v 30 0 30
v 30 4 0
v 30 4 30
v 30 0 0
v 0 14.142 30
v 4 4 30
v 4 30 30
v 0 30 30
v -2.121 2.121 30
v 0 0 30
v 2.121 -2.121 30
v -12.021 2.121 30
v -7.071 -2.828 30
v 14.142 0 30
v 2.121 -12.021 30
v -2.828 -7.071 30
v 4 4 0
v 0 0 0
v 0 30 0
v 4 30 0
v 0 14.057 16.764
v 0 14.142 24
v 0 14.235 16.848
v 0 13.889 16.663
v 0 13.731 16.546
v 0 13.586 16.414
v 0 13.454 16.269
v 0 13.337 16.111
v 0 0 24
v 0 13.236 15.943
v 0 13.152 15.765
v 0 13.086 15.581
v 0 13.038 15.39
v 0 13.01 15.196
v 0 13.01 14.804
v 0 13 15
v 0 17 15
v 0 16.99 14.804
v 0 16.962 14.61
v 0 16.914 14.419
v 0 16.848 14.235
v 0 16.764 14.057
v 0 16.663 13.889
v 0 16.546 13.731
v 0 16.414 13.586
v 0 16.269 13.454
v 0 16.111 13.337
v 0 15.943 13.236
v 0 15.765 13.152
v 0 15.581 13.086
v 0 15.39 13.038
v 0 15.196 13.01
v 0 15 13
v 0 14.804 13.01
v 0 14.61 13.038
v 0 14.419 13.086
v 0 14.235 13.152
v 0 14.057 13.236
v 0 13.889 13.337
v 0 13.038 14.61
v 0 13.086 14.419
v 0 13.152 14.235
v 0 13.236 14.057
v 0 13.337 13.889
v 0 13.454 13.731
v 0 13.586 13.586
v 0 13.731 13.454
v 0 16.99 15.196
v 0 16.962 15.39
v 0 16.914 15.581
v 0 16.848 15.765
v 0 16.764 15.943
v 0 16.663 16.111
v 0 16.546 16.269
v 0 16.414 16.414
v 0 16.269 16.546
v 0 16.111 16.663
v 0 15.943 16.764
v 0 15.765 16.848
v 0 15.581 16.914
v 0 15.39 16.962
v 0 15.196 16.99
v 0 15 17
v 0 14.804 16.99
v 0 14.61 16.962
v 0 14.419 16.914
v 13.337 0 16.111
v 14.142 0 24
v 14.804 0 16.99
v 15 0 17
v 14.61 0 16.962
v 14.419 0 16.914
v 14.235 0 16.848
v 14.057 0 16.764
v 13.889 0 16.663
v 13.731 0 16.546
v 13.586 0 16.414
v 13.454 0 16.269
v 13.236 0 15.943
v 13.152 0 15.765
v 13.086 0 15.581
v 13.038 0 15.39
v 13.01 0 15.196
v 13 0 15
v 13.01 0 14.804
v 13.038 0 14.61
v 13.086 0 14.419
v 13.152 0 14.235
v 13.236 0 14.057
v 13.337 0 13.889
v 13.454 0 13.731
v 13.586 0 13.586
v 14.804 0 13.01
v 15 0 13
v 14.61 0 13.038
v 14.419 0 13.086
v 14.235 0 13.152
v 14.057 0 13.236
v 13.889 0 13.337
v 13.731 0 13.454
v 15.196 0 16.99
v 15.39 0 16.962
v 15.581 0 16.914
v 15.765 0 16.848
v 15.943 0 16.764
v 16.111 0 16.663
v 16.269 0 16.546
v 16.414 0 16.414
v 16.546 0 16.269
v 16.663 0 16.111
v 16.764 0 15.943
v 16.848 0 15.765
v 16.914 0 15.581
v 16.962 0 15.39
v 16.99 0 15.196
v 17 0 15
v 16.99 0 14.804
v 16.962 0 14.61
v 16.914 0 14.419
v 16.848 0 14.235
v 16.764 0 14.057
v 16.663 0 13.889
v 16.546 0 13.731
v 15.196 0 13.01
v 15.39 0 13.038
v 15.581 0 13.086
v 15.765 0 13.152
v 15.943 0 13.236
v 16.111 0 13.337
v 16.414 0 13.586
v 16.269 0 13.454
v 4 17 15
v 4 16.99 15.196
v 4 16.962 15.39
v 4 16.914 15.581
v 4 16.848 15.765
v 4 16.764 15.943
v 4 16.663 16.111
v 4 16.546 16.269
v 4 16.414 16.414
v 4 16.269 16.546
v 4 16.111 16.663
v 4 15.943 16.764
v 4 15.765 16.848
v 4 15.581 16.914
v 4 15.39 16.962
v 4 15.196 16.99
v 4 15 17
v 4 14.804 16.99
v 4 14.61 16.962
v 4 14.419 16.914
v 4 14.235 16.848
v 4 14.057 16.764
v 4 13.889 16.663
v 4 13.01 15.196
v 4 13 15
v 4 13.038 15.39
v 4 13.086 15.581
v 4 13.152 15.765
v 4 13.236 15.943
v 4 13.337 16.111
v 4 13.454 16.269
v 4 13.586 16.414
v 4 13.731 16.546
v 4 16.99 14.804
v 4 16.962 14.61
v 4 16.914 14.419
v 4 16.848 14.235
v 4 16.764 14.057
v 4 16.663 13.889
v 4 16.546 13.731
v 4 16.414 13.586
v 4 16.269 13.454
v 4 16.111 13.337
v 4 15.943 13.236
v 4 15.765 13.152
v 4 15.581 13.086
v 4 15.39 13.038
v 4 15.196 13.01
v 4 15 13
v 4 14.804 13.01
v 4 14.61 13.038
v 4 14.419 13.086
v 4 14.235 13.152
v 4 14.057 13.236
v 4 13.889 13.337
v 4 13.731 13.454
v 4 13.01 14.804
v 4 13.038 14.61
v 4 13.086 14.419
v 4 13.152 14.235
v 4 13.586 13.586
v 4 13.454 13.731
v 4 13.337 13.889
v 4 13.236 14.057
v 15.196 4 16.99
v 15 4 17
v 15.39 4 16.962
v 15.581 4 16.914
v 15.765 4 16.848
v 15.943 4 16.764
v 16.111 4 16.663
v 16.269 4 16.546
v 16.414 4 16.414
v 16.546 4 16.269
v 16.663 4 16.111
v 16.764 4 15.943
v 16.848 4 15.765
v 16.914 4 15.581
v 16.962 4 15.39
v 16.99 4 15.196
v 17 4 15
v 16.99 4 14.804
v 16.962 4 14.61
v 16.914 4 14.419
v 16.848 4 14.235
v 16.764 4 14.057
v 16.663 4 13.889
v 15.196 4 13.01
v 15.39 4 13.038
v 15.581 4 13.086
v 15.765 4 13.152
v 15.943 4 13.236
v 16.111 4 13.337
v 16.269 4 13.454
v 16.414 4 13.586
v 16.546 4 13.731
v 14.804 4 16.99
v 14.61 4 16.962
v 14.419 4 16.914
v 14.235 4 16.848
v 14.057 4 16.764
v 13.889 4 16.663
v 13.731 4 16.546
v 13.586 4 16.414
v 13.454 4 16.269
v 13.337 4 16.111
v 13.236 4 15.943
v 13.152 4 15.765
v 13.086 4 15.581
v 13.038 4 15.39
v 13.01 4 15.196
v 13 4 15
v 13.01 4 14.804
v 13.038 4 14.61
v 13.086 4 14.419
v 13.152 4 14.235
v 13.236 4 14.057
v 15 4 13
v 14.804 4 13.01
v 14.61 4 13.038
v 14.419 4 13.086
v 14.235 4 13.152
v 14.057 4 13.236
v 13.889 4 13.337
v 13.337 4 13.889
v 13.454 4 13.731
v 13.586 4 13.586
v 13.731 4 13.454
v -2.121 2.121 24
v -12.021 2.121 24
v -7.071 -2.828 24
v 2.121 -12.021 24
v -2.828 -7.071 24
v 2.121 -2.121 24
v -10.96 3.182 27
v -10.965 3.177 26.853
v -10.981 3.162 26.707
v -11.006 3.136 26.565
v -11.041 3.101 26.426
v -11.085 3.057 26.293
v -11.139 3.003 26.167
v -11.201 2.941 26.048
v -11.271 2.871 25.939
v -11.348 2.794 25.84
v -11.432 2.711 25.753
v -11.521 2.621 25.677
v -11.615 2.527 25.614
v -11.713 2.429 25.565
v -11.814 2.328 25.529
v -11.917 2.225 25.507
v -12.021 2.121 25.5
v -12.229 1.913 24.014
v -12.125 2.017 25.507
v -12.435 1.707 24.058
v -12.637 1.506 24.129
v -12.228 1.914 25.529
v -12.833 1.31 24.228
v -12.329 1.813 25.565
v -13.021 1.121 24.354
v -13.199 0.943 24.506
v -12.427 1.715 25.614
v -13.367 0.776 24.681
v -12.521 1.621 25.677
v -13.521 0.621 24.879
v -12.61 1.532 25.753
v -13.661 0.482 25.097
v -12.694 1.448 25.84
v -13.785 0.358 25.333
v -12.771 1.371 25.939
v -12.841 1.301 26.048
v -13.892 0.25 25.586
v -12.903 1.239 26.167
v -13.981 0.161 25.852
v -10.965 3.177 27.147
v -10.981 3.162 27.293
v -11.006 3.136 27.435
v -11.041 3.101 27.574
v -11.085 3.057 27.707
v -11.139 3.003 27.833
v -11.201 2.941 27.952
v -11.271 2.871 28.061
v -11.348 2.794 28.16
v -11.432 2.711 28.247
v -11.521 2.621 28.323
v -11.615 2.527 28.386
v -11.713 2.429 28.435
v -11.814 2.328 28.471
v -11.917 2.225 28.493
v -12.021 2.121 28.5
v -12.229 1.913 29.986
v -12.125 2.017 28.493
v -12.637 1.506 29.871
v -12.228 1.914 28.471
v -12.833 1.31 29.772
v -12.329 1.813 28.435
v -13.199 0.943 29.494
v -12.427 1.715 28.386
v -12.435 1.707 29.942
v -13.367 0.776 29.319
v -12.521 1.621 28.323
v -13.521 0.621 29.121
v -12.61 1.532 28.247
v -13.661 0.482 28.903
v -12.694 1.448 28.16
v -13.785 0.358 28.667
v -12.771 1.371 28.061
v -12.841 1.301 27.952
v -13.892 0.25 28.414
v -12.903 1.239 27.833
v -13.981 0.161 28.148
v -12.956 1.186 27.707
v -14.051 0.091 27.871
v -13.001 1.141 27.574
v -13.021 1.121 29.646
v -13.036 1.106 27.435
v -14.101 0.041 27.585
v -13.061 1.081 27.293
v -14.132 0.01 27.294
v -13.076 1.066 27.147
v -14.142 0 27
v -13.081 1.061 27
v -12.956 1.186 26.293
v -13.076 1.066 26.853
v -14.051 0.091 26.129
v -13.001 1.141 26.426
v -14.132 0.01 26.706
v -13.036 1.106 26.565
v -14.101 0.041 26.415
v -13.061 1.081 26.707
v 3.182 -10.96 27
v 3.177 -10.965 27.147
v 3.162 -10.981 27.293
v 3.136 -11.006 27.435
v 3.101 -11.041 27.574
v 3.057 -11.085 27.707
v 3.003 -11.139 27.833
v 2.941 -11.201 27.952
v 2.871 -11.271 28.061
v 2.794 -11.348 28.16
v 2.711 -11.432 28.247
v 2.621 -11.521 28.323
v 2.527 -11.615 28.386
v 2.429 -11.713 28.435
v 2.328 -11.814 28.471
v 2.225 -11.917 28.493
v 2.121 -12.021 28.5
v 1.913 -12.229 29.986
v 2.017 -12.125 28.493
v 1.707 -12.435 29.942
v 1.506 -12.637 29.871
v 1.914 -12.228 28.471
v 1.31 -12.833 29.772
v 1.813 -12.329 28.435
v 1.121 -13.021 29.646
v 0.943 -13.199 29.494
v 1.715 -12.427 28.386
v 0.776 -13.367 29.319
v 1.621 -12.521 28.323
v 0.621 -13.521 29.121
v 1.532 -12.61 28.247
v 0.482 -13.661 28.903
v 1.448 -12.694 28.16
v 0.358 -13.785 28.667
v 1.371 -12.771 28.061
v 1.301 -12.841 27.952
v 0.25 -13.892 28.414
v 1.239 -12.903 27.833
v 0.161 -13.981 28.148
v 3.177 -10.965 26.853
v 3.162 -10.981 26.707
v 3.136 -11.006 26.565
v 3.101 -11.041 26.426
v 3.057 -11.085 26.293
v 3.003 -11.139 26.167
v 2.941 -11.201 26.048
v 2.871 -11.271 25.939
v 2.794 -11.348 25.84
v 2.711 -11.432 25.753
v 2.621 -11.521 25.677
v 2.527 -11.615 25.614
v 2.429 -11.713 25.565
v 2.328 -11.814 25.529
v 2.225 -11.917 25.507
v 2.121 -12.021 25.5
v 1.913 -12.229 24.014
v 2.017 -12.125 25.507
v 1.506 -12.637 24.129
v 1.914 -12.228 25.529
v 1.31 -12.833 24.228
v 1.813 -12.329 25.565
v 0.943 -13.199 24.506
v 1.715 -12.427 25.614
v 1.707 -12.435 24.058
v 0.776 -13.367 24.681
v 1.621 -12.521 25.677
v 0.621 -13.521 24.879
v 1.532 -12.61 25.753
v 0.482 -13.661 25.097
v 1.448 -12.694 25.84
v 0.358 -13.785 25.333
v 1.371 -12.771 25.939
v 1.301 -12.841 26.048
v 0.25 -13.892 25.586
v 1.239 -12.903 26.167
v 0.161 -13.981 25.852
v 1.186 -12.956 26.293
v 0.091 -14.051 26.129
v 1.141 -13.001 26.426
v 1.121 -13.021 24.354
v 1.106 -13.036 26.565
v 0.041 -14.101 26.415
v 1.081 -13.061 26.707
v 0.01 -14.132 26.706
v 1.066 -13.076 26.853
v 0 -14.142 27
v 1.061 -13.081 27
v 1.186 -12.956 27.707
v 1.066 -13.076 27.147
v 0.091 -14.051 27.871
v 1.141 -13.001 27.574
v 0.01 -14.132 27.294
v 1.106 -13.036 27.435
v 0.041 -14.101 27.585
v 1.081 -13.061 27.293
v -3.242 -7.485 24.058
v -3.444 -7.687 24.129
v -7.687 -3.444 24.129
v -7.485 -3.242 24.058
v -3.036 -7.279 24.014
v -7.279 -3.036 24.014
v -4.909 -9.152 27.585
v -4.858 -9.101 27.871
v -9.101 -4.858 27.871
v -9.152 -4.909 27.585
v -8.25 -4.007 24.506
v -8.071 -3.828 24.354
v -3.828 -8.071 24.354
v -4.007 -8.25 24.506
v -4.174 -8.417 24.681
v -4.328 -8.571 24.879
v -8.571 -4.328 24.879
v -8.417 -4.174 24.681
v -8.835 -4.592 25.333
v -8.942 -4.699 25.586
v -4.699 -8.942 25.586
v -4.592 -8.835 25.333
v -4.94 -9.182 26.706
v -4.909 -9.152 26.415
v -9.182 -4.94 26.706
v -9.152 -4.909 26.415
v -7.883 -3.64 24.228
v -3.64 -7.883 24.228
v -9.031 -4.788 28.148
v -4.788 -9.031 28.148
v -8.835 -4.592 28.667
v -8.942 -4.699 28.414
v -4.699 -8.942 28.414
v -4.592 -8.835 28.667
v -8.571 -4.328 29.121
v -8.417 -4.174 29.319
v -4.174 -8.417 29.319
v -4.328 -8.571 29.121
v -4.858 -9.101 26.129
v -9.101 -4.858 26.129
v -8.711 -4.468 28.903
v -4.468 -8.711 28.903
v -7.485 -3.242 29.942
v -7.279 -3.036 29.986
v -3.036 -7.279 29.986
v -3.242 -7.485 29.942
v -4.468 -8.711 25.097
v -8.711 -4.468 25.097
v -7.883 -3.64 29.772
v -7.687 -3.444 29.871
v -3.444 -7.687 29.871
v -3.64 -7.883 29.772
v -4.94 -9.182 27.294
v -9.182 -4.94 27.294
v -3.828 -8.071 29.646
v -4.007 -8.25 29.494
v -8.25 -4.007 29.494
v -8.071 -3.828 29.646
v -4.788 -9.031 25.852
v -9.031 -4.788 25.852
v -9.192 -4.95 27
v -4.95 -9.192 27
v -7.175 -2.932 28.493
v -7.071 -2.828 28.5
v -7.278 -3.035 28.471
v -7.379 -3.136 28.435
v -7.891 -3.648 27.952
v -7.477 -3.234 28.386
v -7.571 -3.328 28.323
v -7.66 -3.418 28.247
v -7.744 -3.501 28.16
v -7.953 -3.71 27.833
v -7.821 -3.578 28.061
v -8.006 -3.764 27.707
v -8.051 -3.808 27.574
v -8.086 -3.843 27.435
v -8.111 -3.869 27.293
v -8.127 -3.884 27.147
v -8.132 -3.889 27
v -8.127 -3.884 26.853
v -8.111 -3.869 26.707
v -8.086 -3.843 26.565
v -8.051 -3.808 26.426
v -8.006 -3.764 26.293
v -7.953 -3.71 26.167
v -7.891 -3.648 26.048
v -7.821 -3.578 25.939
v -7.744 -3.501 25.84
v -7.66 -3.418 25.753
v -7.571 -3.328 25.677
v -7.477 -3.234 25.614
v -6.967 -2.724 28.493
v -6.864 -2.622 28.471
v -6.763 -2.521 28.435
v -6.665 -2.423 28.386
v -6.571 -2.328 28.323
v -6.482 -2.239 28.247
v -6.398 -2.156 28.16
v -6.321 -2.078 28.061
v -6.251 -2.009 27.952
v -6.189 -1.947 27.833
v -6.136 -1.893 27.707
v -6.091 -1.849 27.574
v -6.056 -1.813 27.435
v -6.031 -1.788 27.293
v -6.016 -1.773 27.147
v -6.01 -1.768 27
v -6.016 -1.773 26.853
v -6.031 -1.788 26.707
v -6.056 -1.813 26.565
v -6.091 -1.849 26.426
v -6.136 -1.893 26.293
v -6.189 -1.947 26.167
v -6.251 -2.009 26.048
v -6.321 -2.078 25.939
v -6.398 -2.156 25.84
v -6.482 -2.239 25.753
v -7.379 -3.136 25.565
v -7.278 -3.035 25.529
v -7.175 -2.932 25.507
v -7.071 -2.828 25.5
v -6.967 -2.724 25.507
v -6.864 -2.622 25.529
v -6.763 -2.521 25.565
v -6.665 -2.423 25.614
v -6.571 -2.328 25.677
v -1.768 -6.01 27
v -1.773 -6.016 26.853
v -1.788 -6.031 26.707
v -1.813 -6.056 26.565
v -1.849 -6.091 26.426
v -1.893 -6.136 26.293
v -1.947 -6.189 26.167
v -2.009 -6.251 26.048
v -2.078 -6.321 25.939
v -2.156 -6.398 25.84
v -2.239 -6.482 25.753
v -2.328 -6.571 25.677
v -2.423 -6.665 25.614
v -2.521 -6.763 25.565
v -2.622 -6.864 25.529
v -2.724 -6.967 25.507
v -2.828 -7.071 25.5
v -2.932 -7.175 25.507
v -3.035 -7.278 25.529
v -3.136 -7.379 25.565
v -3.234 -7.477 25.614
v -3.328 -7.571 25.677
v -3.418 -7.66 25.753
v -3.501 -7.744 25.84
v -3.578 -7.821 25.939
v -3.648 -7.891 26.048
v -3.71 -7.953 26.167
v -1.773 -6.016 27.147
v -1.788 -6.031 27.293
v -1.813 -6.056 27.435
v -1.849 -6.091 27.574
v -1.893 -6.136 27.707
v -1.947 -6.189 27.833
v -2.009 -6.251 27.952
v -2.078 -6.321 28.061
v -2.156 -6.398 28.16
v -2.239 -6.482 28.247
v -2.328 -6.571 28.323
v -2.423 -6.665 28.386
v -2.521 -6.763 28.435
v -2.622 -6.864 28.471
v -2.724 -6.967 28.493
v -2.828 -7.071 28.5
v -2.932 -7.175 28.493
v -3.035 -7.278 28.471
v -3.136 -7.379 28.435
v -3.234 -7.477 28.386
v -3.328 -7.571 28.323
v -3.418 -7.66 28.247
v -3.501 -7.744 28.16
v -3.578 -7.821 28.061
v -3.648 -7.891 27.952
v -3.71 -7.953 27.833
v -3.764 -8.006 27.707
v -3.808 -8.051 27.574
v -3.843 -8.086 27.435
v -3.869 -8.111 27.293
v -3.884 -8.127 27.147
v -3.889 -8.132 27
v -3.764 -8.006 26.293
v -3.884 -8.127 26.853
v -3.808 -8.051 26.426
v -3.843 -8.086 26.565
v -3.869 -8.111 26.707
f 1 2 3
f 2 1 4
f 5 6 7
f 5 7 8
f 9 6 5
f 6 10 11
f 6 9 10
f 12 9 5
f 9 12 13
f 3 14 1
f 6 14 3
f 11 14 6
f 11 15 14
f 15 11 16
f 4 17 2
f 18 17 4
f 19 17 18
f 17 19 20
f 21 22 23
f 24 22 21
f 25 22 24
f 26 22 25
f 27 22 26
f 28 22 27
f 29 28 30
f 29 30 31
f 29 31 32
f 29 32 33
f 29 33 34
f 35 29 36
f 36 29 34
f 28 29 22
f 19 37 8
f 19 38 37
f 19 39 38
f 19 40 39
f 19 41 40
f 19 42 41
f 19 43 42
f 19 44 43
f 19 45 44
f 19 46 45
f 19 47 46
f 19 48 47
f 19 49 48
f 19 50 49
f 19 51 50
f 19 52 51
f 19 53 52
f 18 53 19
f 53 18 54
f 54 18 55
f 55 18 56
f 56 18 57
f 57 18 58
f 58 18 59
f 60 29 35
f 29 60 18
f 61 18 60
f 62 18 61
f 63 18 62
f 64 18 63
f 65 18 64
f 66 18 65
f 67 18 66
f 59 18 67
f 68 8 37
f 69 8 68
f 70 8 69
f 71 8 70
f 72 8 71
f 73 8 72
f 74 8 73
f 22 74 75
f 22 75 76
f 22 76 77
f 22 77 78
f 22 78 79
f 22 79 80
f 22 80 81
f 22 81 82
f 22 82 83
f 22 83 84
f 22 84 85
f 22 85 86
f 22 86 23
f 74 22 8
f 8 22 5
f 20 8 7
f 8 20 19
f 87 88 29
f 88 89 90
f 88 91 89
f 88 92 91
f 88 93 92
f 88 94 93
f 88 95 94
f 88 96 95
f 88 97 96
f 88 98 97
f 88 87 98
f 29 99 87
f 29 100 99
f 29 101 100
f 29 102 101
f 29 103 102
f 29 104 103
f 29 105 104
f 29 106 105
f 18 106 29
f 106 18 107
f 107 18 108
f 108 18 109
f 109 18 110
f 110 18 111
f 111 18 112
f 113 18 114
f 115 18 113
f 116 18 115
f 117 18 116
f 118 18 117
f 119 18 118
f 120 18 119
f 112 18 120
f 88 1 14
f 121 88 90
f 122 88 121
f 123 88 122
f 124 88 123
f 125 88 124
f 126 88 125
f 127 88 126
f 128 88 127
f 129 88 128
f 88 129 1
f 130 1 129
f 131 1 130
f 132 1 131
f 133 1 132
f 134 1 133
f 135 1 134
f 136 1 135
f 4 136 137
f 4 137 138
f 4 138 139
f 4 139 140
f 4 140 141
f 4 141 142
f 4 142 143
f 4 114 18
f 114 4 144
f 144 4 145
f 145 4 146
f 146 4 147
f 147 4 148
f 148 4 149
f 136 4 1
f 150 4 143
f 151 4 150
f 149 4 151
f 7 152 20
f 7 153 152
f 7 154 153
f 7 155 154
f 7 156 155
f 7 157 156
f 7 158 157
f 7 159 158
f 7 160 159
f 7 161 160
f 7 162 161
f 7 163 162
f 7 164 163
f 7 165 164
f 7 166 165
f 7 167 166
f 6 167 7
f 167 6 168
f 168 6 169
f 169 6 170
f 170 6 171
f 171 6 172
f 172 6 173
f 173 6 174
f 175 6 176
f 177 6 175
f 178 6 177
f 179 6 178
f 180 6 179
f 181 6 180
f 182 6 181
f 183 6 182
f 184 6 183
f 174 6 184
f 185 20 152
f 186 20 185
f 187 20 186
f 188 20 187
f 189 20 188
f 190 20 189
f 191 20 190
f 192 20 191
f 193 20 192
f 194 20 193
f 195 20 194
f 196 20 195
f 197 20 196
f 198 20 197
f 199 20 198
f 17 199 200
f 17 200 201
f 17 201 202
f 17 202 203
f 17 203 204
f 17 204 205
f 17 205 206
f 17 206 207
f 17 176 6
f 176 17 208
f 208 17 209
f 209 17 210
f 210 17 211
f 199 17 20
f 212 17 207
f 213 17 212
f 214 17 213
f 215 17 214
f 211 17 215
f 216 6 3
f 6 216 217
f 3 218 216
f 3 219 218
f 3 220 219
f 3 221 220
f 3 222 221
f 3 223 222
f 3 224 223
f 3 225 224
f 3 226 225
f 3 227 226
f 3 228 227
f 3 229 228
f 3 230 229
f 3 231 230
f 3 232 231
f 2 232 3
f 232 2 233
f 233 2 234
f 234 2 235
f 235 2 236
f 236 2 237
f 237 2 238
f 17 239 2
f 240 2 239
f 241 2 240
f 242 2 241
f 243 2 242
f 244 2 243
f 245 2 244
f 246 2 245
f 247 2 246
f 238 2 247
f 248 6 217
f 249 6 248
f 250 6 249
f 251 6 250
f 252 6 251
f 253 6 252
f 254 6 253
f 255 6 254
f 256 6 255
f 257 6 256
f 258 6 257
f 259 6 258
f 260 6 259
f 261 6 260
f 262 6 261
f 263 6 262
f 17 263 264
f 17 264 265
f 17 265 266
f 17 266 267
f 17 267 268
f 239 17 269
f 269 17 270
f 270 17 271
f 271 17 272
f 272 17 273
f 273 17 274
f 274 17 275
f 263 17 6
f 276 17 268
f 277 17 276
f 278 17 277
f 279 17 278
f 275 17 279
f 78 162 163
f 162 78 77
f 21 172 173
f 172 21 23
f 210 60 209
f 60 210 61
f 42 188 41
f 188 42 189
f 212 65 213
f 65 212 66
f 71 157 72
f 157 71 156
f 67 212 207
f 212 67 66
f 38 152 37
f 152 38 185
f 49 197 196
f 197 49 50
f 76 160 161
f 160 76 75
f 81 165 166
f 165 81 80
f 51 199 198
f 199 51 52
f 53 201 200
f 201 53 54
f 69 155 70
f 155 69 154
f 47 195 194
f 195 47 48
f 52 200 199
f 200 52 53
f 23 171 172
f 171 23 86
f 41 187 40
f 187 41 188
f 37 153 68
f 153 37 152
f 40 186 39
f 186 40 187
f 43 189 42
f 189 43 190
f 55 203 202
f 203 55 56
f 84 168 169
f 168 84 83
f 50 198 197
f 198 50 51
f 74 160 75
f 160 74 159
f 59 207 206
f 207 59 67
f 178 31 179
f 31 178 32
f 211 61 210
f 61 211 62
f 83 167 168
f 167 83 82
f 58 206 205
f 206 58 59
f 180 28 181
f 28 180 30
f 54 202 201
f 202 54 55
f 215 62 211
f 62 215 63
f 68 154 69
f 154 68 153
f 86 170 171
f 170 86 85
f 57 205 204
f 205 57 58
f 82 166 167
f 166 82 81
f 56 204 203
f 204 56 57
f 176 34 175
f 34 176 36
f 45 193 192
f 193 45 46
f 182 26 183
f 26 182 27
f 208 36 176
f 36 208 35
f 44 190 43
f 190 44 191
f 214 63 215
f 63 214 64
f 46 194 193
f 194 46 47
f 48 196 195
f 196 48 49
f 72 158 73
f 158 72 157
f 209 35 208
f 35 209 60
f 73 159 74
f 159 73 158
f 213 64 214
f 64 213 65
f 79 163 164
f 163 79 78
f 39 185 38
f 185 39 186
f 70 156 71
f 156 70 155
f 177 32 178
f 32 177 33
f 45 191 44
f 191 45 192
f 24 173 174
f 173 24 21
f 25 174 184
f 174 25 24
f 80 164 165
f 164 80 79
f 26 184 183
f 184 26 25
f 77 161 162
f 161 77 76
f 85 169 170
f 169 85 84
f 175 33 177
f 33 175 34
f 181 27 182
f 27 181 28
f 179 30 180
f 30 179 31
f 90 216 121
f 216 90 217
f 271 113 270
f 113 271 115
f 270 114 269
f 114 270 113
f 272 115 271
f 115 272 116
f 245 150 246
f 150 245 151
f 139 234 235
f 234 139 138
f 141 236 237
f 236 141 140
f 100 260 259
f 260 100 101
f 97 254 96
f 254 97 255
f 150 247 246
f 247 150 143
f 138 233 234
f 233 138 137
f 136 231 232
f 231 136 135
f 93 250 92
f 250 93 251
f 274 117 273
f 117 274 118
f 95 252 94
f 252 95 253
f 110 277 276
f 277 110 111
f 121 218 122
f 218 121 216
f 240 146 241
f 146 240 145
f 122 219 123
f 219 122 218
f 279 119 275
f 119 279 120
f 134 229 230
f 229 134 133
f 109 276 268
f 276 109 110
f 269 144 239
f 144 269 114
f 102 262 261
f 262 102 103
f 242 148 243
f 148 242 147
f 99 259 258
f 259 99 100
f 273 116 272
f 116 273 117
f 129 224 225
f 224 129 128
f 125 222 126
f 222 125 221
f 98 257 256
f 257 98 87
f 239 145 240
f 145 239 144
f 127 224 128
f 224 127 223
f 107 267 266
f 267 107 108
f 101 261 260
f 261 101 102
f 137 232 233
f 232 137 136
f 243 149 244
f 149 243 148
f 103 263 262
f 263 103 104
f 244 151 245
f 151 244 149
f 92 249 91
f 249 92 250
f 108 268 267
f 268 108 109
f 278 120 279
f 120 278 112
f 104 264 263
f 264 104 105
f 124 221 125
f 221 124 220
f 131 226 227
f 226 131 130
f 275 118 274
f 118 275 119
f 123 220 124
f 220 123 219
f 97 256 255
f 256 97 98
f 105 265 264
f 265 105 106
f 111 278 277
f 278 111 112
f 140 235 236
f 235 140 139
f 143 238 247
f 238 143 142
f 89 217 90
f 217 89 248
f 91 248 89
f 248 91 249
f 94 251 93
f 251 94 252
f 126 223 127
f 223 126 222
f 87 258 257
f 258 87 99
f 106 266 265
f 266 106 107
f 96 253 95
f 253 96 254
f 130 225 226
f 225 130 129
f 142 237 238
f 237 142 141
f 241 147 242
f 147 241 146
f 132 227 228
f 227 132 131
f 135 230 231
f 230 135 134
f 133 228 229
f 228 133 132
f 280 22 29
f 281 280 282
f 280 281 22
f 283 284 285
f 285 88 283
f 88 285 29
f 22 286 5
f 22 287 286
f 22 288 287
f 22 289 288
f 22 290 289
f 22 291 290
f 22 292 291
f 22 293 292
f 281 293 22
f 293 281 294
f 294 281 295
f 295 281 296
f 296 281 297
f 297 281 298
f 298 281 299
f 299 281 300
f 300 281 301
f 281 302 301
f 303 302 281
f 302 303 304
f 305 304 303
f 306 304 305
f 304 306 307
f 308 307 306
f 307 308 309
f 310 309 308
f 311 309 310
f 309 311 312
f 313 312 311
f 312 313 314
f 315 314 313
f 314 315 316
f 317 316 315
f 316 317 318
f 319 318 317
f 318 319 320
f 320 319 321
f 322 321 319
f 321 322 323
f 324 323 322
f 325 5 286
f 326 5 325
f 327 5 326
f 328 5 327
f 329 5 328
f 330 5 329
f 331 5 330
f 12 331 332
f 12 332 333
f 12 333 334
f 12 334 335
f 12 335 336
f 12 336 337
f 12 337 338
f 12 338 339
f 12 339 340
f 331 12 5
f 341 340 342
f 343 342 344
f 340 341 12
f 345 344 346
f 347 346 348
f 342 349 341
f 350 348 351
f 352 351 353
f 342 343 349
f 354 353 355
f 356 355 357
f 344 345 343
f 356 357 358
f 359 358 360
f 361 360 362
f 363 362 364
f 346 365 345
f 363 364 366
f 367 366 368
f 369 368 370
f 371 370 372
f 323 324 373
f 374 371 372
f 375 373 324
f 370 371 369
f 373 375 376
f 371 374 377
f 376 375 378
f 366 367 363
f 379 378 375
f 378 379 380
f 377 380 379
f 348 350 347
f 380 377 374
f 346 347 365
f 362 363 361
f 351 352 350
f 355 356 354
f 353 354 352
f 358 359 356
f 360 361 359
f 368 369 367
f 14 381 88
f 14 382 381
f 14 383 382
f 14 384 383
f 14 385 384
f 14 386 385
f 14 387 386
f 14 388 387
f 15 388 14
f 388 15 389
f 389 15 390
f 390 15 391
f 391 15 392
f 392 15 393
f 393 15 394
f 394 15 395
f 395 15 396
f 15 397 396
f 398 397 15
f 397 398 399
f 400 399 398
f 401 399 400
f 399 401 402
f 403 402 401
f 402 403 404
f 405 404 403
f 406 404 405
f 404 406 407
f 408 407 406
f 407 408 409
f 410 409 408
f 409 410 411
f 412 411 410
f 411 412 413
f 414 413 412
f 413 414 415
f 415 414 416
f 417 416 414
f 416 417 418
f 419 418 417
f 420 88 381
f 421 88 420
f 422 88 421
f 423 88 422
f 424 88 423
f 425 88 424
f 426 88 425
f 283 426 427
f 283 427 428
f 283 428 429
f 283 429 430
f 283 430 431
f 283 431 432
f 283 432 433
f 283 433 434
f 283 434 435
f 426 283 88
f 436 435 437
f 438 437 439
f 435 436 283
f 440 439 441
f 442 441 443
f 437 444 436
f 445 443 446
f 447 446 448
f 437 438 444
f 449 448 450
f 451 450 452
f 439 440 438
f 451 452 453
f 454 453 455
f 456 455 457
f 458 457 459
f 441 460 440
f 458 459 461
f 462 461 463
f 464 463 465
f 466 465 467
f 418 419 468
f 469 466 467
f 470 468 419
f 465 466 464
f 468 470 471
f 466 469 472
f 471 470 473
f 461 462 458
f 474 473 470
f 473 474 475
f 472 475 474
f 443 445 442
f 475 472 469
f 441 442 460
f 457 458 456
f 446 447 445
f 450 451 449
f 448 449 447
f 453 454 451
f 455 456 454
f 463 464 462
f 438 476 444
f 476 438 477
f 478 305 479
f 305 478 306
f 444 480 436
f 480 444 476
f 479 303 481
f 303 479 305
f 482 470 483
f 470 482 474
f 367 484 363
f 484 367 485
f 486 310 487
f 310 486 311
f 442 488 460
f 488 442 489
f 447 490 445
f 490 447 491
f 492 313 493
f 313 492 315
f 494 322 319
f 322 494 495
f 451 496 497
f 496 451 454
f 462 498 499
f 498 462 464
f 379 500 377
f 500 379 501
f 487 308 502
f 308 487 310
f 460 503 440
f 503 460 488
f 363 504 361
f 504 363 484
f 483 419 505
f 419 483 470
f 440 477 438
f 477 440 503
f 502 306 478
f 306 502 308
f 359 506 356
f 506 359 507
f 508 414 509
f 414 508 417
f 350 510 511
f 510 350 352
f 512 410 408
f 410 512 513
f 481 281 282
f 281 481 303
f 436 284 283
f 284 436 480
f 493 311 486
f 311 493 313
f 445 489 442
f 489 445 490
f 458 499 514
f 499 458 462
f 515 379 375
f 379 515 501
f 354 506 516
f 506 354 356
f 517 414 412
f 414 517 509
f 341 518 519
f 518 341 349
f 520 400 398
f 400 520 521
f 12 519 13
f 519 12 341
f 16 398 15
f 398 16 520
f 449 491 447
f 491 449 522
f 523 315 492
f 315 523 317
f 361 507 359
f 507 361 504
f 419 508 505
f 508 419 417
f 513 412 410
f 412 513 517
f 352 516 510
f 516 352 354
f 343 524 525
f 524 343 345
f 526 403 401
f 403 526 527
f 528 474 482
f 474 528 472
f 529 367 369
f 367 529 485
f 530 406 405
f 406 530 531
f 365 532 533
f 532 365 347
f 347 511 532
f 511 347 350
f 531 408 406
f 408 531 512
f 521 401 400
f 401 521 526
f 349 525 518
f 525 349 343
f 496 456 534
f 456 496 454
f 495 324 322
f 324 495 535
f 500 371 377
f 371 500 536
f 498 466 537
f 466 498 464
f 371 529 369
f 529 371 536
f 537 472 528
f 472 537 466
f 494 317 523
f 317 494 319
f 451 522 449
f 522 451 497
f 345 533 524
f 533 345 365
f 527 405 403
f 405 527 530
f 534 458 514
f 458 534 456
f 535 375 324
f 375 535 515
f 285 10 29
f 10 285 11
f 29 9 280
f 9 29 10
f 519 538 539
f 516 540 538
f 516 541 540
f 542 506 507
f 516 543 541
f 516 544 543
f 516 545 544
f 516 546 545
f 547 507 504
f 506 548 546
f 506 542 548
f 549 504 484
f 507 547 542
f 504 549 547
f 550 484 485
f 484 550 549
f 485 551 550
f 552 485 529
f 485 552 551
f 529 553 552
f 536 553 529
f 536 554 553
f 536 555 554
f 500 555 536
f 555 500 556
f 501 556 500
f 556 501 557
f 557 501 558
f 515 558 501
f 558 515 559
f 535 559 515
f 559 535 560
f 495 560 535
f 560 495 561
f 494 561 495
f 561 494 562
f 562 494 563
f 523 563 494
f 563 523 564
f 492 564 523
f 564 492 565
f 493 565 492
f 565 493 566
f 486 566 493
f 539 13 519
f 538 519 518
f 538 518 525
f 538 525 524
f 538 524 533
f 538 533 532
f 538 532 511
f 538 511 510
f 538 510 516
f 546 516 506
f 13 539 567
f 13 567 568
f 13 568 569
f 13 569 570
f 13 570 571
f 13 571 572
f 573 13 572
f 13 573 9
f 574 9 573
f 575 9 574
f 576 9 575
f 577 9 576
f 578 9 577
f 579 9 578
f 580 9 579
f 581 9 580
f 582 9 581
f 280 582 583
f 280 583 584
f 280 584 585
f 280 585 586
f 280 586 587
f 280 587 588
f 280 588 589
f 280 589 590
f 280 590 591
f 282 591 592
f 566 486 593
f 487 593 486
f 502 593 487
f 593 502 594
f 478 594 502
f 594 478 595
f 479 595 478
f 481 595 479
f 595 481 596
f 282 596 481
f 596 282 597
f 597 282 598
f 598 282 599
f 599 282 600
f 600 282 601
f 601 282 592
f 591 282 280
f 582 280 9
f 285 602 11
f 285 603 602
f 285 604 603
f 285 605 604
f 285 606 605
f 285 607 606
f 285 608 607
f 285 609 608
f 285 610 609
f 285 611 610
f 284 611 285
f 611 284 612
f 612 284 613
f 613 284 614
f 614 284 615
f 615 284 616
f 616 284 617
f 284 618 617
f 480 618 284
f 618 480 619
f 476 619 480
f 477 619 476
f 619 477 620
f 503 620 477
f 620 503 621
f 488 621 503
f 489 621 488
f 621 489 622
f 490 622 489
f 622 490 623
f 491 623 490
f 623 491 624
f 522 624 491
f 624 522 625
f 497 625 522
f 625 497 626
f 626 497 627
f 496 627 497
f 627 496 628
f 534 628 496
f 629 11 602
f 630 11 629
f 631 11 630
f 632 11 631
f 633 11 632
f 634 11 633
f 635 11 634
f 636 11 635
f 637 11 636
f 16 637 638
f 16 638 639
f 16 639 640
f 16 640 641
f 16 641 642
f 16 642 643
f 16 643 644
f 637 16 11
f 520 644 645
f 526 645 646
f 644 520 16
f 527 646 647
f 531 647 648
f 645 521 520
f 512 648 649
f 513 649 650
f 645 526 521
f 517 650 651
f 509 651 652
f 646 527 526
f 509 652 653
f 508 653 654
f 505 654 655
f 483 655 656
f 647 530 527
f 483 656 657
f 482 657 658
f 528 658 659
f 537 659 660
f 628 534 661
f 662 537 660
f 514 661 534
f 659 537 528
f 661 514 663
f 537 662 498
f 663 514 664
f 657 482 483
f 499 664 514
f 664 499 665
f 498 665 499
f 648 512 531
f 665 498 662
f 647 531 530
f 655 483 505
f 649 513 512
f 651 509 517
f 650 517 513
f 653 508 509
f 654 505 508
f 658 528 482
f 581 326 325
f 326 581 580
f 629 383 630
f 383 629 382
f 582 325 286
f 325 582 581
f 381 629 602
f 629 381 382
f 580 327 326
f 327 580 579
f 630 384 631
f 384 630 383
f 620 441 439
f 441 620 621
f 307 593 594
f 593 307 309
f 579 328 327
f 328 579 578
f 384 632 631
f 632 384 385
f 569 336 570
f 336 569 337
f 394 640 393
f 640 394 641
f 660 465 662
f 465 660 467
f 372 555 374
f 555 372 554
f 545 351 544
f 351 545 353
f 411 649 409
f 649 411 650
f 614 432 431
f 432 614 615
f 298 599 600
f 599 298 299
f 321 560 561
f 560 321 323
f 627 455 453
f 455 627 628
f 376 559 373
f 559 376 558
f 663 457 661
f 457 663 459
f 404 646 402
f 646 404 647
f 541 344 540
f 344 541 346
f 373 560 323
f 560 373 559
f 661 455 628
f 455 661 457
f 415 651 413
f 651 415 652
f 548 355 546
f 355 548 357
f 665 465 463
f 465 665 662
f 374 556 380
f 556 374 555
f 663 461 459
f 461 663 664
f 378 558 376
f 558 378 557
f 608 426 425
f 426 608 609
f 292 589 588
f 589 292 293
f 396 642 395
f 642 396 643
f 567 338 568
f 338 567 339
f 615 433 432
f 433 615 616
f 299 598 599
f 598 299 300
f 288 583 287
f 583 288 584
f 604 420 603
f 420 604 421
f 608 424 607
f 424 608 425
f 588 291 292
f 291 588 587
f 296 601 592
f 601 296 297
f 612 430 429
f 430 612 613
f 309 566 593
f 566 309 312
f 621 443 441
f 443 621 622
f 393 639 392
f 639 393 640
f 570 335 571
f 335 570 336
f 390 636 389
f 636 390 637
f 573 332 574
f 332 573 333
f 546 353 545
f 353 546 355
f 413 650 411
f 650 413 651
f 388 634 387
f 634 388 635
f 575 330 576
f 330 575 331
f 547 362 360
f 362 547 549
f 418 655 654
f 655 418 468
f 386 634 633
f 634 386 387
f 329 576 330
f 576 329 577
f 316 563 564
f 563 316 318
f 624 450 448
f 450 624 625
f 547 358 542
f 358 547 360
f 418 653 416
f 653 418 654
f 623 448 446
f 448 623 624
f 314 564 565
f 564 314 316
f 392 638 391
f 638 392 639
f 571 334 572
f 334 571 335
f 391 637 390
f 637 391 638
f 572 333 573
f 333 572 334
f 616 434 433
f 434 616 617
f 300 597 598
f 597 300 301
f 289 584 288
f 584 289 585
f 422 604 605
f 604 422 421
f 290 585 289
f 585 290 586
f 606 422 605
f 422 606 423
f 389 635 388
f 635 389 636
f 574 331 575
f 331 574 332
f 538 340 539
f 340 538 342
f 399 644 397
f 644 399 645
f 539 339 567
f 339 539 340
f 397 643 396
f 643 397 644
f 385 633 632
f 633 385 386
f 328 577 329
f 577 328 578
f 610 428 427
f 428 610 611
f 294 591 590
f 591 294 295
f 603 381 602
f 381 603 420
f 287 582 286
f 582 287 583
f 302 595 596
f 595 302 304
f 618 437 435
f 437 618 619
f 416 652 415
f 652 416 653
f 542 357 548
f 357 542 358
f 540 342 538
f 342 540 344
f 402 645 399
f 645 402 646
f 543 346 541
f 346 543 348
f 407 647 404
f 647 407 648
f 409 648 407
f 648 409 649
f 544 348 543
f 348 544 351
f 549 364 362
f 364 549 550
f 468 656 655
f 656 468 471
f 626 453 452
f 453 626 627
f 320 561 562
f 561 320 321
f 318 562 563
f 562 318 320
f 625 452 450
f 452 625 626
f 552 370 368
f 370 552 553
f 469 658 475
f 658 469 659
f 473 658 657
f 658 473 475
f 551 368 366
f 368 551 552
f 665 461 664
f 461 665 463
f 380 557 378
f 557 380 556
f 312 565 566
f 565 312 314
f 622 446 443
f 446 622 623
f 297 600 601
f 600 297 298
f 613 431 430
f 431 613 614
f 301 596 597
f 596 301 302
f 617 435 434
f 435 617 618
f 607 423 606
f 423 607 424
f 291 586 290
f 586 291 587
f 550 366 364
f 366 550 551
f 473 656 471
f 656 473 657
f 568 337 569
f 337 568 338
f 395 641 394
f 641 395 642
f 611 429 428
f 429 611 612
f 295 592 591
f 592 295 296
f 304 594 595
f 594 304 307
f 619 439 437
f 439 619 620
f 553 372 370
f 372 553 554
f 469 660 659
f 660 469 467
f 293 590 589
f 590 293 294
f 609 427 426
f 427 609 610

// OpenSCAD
$fn = 64;
union() {
    difference() {
        cube(30);
        translate([4, 4, 0])
            cube(30);
        translate([0, 15, 15])
            rotate([0, 90, 0])
                cylinder(4, 2, 2);
        
        translate([15, 0, 15])
            rotate([0, 90, 90])
                cylinder(4, 2, 2);

    }

    difference() {
        rotate([0, 0, 45])
            translate([-10, -10, 24])
                difference() {
                    union() {
                        difference() {
                            cube([30, 20, 6]);
                            cube([3, 20, 6]);
                        }
                        translate([3, 0, 3]) {
                            rotate([-90, 0, 0]) {
                                cylinder(20, 3, 3);
                            }
                        }
                    }
                    translate([0, 7, 0]) {
                        cube([10, 6, 6]);
                    }
                    translate([3, 20, 3]) {
                        rotate([90, 0, 0]) {
                            cylinder(20, 1.5, 1.5);
                        }
                    }
                }
        translate([4, 4, 0])
            cube(40);
    }
}
